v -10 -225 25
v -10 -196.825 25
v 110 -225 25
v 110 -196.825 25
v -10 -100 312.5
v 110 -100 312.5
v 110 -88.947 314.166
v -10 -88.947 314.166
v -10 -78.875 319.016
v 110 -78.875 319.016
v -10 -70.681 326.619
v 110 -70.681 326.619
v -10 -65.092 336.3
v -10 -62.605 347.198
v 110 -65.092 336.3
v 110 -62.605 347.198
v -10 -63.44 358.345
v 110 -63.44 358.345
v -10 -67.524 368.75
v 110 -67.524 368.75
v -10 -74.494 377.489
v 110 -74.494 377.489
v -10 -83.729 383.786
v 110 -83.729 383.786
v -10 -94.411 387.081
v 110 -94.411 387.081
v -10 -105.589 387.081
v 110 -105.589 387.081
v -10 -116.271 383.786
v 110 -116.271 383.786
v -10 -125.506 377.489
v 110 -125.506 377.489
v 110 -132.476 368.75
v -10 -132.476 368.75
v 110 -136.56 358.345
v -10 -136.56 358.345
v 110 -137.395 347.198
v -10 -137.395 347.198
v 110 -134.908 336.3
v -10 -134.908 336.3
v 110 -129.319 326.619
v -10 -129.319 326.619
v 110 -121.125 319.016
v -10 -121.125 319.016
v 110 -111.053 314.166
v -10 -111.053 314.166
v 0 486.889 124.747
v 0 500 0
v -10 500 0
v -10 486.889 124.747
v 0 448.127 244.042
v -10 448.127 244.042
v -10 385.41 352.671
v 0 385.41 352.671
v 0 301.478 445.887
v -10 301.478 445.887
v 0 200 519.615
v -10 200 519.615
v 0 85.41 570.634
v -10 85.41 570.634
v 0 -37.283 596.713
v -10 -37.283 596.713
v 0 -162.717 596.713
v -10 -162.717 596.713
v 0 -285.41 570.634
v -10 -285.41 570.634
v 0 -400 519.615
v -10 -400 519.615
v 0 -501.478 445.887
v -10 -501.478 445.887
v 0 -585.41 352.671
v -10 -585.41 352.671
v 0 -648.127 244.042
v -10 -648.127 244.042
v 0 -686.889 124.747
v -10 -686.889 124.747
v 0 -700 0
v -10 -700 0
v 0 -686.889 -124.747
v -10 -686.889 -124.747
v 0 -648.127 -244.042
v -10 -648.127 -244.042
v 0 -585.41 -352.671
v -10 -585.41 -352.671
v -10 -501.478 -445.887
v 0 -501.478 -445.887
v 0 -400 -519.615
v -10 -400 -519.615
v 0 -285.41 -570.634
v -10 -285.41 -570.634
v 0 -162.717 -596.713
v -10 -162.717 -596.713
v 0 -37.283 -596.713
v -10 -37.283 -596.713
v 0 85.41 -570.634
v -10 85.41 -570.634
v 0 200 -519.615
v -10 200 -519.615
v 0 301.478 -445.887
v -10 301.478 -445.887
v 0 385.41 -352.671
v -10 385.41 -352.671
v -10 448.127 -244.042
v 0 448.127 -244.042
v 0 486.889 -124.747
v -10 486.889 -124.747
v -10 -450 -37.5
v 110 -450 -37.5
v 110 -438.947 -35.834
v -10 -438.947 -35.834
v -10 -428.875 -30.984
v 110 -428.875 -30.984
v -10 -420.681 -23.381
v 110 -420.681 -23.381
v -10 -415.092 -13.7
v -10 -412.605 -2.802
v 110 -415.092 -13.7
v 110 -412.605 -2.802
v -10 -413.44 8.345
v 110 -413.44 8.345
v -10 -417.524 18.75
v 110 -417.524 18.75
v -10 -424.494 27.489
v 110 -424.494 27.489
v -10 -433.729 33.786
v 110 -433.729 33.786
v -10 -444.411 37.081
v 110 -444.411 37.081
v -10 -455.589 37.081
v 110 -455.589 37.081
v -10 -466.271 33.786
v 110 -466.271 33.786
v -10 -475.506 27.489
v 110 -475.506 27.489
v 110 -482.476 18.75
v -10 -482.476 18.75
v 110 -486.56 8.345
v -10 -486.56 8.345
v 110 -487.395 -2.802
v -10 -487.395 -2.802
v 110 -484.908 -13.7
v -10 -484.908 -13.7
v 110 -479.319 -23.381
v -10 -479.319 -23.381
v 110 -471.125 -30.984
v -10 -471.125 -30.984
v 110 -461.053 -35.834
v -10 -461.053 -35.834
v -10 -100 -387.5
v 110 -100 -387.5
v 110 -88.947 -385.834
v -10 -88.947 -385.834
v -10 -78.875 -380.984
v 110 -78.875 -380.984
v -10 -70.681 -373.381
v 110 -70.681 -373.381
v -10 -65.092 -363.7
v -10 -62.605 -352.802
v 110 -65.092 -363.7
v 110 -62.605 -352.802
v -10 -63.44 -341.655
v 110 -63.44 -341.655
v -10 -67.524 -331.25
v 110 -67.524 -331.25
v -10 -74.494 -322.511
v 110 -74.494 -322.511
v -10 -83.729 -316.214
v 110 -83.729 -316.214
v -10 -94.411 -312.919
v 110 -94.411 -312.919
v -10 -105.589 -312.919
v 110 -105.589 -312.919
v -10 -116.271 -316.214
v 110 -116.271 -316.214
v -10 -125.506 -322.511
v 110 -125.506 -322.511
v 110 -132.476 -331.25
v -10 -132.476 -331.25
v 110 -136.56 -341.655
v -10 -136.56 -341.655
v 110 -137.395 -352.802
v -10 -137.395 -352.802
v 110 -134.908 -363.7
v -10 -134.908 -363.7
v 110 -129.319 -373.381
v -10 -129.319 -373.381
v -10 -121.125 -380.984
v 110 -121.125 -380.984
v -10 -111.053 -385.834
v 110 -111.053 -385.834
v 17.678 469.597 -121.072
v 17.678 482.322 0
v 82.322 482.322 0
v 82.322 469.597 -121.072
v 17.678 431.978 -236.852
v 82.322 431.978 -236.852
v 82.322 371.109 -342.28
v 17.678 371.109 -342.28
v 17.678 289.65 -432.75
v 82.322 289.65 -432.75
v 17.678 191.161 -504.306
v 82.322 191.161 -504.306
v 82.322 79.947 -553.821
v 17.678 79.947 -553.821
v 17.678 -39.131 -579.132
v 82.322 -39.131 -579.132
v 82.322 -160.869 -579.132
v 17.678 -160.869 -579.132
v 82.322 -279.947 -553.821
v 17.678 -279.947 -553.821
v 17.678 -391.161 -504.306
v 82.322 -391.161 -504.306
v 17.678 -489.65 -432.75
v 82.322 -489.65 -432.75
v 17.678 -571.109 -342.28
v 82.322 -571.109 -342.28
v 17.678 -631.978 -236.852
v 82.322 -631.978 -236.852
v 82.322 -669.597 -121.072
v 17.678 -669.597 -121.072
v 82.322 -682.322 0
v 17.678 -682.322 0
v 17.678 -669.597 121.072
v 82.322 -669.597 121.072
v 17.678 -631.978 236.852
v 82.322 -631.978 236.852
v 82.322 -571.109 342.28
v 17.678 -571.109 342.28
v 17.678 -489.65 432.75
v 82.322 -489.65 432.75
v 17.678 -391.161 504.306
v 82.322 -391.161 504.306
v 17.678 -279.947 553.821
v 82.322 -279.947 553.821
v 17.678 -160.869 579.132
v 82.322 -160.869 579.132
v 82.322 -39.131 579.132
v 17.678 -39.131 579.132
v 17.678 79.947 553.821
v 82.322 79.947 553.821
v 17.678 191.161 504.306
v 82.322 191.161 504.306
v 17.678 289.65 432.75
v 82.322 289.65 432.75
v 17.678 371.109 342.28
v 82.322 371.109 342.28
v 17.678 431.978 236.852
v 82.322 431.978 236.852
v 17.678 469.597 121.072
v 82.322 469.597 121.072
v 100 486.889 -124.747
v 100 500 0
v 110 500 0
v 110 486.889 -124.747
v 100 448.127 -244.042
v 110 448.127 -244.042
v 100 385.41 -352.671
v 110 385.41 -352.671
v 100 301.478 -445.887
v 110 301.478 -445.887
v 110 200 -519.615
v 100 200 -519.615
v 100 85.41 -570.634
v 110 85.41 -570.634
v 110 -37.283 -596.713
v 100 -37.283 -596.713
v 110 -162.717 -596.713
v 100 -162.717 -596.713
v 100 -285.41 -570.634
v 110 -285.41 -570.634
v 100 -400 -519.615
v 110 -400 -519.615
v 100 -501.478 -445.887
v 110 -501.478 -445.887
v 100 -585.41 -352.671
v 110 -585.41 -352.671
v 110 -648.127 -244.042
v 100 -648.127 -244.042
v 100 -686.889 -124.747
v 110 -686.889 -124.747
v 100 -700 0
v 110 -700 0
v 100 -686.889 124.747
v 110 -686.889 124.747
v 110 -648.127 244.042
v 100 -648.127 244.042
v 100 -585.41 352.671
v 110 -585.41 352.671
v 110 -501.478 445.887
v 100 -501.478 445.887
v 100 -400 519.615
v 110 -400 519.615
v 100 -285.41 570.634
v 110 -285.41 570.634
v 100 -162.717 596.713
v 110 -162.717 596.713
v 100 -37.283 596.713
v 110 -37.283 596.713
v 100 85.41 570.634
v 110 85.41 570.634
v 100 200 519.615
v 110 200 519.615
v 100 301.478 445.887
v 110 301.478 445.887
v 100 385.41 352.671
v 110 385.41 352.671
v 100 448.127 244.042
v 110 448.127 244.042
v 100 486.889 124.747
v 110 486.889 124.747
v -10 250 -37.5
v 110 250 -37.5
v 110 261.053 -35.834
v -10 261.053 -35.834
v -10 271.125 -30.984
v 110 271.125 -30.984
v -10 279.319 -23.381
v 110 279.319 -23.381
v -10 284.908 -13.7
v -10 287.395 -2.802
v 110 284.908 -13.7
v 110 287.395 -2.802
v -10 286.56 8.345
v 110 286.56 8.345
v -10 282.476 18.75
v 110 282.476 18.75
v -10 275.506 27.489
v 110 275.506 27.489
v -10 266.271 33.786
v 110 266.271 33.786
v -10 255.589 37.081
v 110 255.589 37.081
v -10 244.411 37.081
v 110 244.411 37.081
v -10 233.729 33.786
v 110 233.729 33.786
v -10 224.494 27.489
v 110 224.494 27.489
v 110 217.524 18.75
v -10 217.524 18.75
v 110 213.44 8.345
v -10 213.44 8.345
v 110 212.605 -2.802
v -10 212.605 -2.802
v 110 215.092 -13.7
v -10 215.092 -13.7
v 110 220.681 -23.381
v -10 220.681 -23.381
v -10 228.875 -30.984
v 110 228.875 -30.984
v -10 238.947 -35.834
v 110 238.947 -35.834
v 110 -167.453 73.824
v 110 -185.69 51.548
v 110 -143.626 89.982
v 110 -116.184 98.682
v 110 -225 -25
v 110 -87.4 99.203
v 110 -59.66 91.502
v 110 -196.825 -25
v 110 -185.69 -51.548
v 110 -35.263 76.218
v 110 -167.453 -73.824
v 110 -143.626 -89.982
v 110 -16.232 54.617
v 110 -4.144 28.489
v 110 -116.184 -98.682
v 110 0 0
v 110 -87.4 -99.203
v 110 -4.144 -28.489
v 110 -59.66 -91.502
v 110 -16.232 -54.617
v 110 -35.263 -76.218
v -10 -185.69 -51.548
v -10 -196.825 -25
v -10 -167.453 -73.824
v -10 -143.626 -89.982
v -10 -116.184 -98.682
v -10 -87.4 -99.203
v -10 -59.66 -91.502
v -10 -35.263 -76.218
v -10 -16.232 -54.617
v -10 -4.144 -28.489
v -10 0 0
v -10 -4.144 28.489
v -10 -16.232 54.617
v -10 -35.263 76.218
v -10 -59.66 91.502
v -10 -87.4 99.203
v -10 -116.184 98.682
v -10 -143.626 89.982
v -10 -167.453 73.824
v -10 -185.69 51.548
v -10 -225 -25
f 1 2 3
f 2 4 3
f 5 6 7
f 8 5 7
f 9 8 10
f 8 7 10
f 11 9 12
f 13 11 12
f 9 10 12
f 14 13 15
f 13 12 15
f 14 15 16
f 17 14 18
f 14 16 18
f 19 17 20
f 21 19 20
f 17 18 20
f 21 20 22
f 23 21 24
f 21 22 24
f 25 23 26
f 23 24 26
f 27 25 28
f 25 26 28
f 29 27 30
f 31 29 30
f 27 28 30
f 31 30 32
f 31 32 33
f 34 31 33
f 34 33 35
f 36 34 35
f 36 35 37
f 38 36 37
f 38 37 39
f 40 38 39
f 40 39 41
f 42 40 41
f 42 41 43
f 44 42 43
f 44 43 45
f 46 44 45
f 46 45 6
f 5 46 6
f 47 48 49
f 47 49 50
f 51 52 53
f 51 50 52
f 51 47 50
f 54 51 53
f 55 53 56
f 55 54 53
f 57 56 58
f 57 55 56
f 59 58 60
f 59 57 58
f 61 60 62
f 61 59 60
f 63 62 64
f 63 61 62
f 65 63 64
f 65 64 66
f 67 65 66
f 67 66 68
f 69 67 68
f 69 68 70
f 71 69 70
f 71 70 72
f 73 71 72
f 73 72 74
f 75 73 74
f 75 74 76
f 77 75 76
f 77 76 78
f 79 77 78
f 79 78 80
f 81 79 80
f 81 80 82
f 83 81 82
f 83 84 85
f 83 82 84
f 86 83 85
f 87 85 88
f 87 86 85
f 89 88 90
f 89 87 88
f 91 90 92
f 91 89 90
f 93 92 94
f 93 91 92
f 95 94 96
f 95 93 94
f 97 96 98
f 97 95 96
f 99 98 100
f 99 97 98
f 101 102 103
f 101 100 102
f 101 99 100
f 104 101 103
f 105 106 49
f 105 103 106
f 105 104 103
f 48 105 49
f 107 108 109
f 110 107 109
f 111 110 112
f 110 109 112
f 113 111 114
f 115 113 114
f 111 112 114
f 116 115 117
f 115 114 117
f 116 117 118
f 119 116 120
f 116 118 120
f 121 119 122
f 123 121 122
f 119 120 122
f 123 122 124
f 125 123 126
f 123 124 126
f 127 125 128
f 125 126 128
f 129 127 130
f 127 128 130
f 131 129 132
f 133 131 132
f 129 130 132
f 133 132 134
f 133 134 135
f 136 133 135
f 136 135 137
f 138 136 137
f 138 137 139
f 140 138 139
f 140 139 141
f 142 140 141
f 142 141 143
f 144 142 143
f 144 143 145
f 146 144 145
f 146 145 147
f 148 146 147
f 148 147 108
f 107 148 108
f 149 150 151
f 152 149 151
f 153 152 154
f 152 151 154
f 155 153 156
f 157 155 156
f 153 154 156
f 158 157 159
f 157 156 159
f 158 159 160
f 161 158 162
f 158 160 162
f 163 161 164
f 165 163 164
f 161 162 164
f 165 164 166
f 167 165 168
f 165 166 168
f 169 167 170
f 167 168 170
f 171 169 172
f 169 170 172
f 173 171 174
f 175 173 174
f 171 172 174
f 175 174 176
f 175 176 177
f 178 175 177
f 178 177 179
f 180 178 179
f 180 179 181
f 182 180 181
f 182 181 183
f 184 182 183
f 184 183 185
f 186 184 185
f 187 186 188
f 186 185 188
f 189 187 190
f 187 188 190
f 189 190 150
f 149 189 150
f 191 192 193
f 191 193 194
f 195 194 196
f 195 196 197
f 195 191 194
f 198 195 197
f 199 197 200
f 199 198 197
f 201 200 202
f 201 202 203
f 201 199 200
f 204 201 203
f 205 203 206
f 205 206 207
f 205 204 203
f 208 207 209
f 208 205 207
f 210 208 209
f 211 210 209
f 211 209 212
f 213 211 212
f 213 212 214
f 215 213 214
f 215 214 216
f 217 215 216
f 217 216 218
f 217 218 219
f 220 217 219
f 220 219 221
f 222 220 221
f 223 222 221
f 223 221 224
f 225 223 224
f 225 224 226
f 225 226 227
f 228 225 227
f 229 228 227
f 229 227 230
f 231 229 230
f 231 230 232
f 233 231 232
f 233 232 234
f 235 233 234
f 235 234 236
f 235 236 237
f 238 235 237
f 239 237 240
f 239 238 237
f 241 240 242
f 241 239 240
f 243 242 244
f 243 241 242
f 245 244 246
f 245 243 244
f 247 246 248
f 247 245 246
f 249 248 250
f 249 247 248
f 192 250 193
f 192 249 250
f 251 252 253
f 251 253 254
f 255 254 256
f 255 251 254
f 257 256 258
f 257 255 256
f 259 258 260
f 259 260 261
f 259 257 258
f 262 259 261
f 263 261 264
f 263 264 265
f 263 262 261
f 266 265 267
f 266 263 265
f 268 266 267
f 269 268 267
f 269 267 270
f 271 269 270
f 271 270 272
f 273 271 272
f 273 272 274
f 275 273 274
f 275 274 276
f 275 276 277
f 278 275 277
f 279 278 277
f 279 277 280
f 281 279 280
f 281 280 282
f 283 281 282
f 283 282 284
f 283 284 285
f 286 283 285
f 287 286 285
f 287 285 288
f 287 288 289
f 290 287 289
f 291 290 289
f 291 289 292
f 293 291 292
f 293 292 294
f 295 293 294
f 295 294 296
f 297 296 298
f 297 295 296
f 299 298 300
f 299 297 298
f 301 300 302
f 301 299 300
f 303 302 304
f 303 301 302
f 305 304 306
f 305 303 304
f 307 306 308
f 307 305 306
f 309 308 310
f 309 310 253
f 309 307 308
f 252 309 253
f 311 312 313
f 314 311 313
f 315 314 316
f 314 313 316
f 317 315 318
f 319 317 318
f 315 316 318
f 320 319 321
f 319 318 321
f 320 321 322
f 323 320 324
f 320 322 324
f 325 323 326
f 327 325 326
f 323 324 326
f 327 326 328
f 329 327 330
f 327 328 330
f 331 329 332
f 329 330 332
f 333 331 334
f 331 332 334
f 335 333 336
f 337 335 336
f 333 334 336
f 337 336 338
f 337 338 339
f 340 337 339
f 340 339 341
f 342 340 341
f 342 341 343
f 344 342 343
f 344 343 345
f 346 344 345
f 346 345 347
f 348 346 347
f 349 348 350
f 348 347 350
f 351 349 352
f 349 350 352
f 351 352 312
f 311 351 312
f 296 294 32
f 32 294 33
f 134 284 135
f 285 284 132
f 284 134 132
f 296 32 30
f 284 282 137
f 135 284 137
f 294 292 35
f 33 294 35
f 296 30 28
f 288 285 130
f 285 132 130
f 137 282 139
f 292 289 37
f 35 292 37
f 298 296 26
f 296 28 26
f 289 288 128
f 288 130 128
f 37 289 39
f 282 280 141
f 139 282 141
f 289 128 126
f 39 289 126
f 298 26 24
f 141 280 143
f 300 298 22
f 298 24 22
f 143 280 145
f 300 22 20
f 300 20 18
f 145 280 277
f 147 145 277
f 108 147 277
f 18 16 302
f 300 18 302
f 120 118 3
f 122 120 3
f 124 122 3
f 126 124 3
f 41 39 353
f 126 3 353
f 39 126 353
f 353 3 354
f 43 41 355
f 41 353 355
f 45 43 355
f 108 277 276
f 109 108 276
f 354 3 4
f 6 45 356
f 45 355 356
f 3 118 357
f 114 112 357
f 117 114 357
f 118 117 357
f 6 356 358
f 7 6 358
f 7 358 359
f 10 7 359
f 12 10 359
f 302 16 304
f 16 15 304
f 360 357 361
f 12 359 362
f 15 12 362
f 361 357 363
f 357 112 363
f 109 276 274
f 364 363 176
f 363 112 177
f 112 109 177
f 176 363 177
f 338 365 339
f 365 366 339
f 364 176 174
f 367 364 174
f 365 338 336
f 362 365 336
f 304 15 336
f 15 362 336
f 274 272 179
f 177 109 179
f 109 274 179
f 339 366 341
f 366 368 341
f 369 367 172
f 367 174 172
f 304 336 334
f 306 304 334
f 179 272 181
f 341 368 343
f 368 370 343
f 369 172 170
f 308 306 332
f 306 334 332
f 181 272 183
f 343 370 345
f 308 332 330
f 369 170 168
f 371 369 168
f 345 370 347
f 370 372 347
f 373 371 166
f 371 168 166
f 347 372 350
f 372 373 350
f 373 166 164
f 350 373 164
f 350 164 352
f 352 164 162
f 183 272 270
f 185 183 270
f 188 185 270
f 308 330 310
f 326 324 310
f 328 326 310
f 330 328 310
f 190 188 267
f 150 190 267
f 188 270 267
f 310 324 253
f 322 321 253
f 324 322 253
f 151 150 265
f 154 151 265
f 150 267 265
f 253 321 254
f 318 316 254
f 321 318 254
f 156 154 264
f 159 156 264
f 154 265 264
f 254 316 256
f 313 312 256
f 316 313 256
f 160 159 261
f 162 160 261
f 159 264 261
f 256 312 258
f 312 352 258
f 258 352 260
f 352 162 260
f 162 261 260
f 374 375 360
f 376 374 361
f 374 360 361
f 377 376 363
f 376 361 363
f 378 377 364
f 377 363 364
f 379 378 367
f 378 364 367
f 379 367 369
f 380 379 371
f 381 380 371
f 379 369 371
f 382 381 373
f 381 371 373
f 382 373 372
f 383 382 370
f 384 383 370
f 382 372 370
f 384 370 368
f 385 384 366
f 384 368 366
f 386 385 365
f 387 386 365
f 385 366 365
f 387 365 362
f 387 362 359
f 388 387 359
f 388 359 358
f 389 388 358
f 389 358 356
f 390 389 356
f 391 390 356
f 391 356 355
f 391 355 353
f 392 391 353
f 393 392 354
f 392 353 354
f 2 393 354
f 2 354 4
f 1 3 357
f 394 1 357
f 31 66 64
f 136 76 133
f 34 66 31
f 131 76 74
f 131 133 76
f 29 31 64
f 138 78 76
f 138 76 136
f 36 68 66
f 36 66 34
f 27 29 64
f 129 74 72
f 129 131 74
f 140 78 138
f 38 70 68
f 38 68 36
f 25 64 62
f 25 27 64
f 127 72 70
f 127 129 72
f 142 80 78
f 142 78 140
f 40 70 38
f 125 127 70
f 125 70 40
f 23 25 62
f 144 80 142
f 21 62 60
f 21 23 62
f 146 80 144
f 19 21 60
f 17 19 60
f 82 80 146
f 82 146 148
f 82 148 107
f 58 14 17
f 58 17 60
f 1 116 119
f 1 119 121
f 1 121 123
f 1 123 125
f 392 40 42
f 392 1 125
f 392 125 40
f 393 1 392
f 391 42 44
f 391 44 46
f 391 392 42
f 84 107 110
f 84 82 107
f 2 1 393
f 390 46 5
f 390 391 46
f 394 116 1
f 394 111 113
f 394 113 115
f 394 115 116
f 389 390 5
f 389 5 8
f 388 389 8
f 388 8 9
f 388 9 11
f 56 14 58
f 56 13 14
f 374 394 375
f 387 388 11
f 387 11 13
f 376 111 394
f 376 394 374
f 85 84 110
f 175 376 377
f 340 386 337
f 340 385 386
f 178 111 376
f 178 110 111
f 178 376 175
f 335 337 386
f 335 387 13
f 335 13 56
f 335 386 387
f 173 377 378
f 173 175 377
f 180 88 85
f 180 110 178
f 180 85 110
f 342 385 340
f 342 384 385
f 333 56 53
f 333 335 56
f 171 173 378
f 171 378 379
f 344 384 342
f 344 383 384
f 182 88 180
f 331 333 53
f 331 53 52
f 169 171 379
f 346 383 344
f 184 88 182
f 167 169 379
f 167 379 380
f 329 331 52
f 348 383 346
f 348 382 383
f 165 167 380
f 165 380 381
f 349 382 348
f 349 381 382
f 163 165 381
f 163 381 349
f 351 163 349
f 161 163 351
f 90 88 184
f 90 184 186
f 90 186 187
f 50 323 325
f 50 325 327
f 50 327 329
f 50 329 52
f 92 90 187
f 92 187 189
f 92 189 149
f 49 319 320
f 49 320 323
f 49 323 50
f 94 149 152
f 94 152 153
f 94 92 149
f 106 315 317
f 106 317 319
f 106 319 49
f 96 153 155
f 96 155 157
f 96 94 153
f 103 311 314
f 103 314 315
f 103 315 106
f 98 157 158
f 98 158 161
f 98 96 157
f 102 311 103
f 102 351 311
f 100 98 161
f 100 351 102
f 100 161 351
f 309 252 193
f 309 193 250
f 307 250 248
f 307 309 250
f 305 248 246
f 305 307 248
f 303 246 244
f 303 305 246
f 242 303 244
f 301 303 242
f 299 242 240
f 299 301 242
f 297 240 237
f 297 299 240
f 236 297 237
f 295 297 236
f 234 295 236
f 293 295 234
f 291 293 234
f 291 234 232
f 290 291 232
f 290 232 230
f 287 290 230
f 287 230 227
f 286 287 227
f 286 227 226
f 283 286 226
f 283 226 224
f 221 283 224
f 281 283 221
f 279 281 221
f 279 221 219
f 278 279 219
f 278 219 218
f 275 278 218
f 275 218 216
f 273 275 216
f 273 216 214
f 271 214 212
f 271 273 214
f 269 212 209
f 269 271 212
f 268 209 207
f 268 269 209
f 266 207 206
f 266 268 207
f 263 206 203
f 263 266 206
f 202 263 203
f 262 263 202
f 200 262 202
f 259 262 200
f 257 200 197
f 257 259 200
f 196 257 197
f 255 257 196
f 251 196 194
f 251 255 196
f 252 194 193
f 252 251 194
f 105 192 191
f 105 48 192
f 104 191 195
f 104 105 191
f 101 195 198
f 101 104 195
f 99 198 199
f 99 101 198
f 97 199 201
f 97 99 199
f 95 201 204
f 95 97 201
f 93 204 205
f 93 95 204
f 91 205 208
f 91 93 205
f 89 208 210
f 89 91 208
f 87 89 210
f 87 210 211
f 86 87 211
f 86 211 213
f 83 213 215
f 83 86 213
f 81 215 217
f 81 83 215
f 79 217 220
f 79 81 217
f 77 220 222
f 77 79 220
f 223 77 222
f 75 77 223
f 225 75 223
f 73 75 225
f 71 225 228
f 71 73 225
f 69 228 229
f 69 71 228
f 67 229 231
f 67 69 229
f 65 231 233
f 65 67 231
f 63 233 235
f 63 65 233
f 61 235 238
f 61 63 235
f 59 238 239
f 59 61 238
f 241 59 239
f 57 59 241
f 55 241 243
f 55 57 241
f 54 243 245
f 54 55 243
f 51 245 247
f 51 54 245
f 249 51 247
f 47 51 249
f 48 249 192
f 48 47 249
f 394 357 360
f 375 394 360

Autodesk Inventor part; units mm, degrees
ref_plane "YZ Plane" through (0, 0, 0) normal (1, 0, 0) x (0, 1, 0)
ref_plane "XZ Plane" through (0, 0, 0) normal (0, 1, 0) x (-1, 0, 0)
ref_plane "XY Plane" through (0, 0, 0) normal (0, 0, 1) x (1, 0, 0)
sketch "Boceto1" plane through (0, 0, 0) normal (0, 0, 1) x (1, 0, 0)
  line L0 (0, 0) -> (0, 500)
  line L1 (100, 500) -> (100, 0)
  line L2 (100, 0) -> (0, 0)
  line L3 (0, 500) -> (17.6777, 482.3223)
  line L4 (100, 500) -> (82.3223, 482.3223)
  line L5 (82.3223, 482.3223) -> (17.6777, 482.3223)
  line L6 (50, -100) -> (-150, -100)
revolve "Revolución1" add sketch "Boceto1" angle 360 about axis through (50, -100, 0) along (-1, 0, 0)
sketch "Boceto2" plane through (100, -100, 0) normal (1, 0, 0) x (0, 0, -1)
  circle A0 centre (0, 0) radius 100 projected
  circle A1 centre (-350, 0) radius 37.5
  circle A2 centre (0, 350) radius 37.5
  circle A3 centre (350, 0) radius 37.5
  circle A4 centre (0, -350) radius 37.5
  point P0 (0, 100)
  dimension "d26" = 360
extrude "Extrusión1" cut sketch "Boceto2" against normal blind 100 contours A1 | A2 | A3 | A4
thicken "Engrosado1" operation add thickness 10 both sides no extend neighbours no toward (1, 0, 0) faces at (100, -364.9419, 262.9039)
thicken "Engrosado2" operation add thickness 10 both sides no extend neighbours no toward (-1, 0, 0) faces at (0, -364.9419, 262.9039)
sketch "Boceto3" plane through (110, -100, 0) normal (1, 0, 0) x (0, 0, -1)
  line L0 (-25, -96.8246) -> (-25, -125)
  line L1 (-25, -125) -> (25, -125)
  line L2 (25, -125) -> (25, -96.8246)
  circle A0 centre (0, 0) radius 100 projected
  arc A1 (-25, -96.8246) -> (25, -96.8246) centre (0, 0) ccw
  point P0 (0, 100)
  point P1 (0, -100)
emboss "Repujado1" sketch "Boceto3" operation cut depth 120 direction (-1, 0, 0) contours A0 L2 L1 L0
properties part number "POLEA Pieza"
